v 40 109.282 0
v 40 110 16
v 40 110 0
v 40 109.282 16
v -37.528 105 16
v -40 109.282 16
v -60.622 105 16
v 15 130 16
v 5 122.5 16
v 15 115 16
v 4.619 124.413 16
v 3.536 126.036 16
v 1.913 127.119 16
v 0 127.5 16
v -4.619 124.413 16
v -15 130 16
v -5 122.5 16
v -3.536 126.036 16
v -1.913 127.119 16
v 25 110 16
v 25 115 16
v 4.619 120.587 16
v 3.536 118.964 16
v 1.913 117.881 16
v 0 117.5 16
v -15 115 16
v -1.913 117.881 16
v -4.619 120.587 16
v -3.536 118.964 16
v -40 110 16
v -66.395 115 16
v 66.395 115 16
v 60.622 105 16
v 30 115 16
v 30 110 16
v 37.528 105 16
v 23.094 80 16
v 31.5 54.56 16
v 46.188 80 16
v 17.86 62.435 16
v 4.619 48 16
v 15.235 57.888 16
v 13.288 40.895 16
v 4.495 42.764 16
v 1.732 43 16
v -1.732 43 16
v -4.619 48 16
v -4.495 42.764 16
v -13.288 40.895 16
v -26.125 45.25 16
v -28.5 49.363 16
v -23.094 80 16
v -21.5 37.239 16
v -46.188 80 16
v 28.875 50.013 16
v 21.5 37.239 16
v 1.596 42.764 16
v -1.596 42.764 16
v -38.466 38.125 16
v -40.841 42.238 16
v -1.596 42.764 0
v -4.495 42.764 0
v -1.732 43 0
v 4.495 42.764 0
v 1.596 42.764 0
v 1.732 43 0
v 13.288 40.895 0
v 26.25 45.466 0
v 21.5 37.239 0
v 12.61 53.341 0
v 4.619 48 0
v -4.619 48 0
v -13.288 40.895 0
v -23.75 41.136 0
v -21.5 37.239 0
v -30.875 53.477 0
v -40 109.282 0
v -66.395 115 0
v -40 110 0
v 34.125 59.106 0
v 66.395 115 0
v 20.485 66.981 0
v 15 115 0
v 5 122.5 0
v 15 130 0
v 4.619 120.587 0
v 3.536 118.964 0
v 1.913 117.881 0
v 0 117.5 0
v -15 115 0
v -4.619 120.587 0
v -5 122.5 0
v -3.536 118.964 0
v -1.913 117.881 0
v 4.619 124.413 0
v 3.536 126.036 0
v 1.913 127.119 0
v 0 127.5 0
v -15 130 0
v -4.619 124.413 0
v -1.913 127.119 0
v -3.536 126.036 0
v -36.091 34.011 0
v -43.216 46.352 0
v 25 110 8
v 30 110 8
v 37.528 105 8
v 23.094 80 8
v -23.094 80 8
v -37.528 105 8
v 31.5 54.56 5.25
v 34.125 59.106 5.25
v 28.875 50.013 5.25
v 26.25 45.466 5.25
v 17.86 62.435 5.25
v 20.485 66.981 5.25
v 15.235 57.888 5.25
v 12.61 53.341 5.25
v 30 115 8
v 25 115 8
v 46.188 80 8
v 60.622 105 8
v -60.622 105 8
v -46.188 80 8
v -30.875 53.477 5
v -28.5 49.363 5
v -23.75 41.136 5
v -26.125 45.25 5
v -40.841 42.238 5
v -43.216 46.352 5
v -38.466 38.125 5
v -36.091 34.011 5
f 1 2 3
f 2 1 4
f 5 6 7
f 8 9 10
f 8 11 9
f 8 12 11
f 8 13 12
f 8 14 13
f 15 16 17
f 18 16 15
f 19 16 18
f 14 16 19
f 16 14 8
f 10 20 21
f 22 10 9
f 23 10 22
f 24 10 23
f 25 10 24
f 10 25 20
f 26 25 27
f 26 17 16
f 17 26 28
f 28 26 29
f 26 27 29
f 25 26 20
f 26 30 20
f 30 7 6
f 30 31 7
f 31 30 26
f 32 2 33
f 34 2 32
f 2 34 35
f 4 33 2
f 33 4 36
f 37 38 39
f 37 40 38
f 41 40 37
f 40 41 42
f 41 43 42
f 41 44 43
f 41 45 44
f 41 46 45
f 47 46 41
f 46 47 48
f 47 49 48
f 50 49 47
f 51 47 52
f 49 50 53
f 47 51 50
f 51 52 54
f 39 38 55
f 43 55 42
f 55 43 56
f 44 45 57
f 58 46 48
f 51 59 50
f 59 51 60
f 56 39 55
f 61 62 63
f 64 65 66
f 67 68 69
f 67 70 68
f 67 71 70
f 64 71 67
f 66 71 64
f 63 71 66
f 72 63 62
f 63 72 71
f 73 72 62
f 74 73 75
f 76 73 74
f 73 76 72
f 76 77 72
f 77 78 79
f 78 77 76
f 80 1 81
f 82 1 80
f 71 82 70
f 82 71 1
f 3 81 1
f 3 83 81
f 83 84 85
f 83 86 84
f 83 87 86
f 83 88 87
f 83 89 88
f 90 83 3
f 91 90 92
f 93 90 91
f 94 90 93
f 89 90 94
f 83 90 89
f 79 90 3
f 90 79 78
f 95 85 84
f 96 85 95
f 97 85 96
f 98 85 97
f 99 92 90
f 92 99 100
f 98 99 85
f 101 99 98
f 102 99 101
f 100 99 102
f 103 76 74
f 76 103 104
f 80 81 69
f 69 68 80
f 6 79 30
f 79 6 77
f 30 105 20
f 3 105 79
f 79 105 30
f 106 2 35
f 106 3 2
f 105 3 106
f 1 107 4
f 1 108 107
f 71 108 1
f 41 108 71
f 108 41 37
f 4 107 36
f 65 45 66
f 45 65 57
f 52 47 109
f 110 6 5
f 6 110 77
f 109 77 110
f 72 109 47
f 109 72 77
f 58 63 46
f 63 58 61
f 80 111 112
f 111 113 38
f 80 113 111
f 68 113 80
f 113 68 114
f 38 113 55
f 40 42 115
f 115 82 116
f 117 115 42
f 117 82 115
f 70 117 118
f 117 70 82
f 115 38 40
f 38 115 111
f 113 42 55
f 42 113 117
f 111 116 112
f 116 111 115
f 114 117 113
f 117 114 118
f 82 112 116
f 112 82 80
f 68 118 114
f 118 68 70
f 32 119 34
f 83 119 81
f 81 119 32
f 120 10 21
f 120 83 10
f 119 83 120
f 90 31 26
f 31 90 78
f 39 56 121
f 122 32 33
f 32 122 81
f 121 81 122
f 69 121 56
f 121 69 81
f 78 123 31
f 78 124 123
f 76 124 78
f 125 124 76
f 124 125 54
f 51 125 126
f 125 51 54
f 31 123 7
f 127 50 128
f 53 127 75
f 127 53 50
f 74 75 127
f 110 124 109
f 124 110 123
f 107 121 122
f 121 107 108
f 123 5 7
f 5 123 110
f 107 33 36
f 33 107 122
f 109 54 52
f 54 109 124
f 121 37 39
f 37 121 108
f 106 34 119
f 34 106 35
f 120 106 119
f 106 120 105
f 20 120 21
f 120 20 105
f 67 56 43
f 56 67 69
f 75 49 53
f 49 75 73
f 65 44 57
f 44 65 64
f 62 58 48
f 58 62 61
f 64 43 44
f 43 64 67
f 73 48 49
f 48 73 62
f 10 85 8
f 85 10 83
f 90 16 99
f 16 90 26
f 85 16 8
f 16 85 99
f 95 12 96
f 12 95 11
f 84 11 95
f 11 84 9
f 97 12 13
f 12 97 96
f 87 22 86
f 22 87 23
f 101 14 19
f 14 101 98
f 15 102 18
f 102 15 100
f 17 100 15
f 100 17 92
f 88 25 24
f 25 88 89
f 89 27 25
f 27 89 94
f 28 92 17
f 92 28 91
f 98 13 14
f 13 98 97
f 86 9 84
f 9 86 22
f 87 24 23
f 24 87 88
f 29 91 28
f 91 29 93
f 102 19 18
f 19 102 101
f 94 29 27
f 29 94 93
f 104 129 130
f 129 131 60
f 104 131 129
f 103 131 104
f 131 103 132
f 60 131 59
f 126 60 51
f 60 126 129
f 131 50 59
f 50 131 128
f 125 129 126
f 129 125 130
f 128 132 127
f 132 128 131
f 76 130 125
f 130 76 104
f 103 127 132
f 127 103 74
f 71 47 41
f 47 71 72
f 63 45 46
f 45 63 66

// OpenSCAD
// file: bearing.scad
/*
 * Copyright (c) 2012 Haydn Vesta
 * 
 * See the file license.txt for copying permission.
 * 
 * 
 * DISCLAIMER!
 * THIS IS NOT A PRINTED PART
 * IT IS A PLACEHOLDER FOR A THIRD-PARTY BEARING
 */
include <params.scad>

module bearing() {
  difference() {
    cylinder(h=bearing_height,  r=bearing_or);
    cylinder(h=bearing_height, r=bearing_ir);
  }
}

bearing();
// file: params.scad
/*
 * Copyright (c) 2012 Haydn Vesta
 * 
 * See the file license.txt for copying permission.
 * 
 */

// GLOBAL
hole_radius = 5;
peg_radius = 4.5;

// MAGNET
mag_height = 6.4;
mag_ring_ir = 50;
mag_ring_or = 102;
mag_count = 16;

// BEARING
bearing_height = 25;
bearing_ir = 34;
bearing_or = 43;

// STATOR
stator_height = 16;
stator_inner_height = stator_height/2;
stator_count = 6;
stator_incidence = 360/stator_count;
stator_radius = 115;
stator_tab_width = 10;
stator_tab_offset = 50;
stator_wiring_gap = 25;
stator_wiring_gap_inset = stator_radius - (stator_wiring_gap + 10);
stator_outer_tab_extrude = 15;
stator_outer_tab_width = 30;
stator_notch = 15;
stator_notch_width = 5;
coil_edge = 80;
coil_block_length = 70;

// ROTOR & ROTOR CAP
rotor_height = mag_height + 2;
rotor_inner_height = 3;
rotor_radius = 105;
rotor_inner_radius = 20;
rotor_count = 8;
rotor_incidence = 360/rotor_count;
rotor_tie_hole_offset = 30;
rotor_tab_excess = 8;

rotor_cap_radius = 50;
rotor_cap_peg_radius = 35;
rotor_cap_inner_radius = 10;
rotor_cap_height = 10;
rotor_cap_insert_height = 10;
rotor_cap_bearing_inset = (bearing_height + rotor_inner_height) - rotor_cap_height;
rotor_plate_height = 5;
blade_holder_edge = 20;
rotor_peg_width = 12;
rotor_peg_height = (rotor_height * 2) + (rotor_cap_height * 2) + stator_height;

// ROTOR EDGE TIE
rotor_edge_tie_length = 40;
rotor_edge_tie_width = 20;
rotor_edge_tie_inner_height = 5;
rotor_edge_tie_height = rotor_height + rotor_plate_height;
rotor_edge_tie_peg_inset = 10;
// main file
/*
 * Copyright (c) 2012 Haydn Vesta
 * 
 * See the file license.txt for copying permission.
 *
 */

include <params.scad>
use <bearing.scad>


stator_x = stator_radius * 1.25;

module coil_subtractor() {
 rotate([0, 0, -30]) {
    cube([coil_edge/2, coil_edge*1.5, stator_height]);
  }
}

module coil() {
  difference() {
    translate([coil_edge/-2, 0, 0]) {
      cube([coil_edge, coil_block_length, stator_height]);
    }
    coil_subtractor();
    mirror([1, 0, 0]) coil_subtractor();
  }
}

module subtractor() {
  rotate([0, 0, -90 + stator_incidence]) {
    cube([stator_radius*0.75, stator_radius*1.5, stator_height]);
  }
}

module tab() {
  difference() {
    cube([stator_outer_tab_width, stator_outer_tab_extrude, stator_height]);
    translate([stator_outer_tab_width/2, stator_outer_tab_extrude/2, 0]) {
      cylinder(h=stator_height, r=hole_radius);
    }
  }
}

module notch() {
  translate([0, (stator_notch/2) - (stator_notch_width/2), 0]) {
    cube([stator_notch, stator_notch_width, stator_height]);
  }
  translate([0, 0, 0]) {
    cube([stator_notch, stator_notch, stator_notch_width]);
  }
}

module stator() {
  difference() {
    translate([stator_x/-2, 0, 0]) {
      cube([stator_x, stator_radius, stator_height]);
    }
    translate([0, coil_edge/2, 0]) coil();
    subtractor();
    mirror([1, 0, 0]) subtractor();
    rotate([0, 0, -90 + stator_incidence]) {
      scale([1.05, 1.05, 1.05]) translate([-stator_notch, stator_tab_offset, 0]) notch();
    }
    translate([stator_x/-2, stator_wiring_gap_inset, stator_height - stator_inner_height]) {
      cube([stator_x, stator_wiring_gap, stator_inner_height]);
    }
    translate([25, stator_radius - stator_notch, stator_height/2]) {
      cube([stator_notch_width, stator_radius/2, stator_height/2]);
    }
    cylinder(h=stator_height, r=bearing_or);
  }
  translate([-5, bearing_or, 0]) cube([10, 5, stator_height]);
  translate([stator_outer_tab_width/-2, stator_radius, 0]) tab();
  rotate([0, 0, 90 - stator_incidence]) {
    scale([0.95, 0.95, 1]) translate([-stator_notch, stator_tab_offset, 0]) notch();
  }
}

stator();
